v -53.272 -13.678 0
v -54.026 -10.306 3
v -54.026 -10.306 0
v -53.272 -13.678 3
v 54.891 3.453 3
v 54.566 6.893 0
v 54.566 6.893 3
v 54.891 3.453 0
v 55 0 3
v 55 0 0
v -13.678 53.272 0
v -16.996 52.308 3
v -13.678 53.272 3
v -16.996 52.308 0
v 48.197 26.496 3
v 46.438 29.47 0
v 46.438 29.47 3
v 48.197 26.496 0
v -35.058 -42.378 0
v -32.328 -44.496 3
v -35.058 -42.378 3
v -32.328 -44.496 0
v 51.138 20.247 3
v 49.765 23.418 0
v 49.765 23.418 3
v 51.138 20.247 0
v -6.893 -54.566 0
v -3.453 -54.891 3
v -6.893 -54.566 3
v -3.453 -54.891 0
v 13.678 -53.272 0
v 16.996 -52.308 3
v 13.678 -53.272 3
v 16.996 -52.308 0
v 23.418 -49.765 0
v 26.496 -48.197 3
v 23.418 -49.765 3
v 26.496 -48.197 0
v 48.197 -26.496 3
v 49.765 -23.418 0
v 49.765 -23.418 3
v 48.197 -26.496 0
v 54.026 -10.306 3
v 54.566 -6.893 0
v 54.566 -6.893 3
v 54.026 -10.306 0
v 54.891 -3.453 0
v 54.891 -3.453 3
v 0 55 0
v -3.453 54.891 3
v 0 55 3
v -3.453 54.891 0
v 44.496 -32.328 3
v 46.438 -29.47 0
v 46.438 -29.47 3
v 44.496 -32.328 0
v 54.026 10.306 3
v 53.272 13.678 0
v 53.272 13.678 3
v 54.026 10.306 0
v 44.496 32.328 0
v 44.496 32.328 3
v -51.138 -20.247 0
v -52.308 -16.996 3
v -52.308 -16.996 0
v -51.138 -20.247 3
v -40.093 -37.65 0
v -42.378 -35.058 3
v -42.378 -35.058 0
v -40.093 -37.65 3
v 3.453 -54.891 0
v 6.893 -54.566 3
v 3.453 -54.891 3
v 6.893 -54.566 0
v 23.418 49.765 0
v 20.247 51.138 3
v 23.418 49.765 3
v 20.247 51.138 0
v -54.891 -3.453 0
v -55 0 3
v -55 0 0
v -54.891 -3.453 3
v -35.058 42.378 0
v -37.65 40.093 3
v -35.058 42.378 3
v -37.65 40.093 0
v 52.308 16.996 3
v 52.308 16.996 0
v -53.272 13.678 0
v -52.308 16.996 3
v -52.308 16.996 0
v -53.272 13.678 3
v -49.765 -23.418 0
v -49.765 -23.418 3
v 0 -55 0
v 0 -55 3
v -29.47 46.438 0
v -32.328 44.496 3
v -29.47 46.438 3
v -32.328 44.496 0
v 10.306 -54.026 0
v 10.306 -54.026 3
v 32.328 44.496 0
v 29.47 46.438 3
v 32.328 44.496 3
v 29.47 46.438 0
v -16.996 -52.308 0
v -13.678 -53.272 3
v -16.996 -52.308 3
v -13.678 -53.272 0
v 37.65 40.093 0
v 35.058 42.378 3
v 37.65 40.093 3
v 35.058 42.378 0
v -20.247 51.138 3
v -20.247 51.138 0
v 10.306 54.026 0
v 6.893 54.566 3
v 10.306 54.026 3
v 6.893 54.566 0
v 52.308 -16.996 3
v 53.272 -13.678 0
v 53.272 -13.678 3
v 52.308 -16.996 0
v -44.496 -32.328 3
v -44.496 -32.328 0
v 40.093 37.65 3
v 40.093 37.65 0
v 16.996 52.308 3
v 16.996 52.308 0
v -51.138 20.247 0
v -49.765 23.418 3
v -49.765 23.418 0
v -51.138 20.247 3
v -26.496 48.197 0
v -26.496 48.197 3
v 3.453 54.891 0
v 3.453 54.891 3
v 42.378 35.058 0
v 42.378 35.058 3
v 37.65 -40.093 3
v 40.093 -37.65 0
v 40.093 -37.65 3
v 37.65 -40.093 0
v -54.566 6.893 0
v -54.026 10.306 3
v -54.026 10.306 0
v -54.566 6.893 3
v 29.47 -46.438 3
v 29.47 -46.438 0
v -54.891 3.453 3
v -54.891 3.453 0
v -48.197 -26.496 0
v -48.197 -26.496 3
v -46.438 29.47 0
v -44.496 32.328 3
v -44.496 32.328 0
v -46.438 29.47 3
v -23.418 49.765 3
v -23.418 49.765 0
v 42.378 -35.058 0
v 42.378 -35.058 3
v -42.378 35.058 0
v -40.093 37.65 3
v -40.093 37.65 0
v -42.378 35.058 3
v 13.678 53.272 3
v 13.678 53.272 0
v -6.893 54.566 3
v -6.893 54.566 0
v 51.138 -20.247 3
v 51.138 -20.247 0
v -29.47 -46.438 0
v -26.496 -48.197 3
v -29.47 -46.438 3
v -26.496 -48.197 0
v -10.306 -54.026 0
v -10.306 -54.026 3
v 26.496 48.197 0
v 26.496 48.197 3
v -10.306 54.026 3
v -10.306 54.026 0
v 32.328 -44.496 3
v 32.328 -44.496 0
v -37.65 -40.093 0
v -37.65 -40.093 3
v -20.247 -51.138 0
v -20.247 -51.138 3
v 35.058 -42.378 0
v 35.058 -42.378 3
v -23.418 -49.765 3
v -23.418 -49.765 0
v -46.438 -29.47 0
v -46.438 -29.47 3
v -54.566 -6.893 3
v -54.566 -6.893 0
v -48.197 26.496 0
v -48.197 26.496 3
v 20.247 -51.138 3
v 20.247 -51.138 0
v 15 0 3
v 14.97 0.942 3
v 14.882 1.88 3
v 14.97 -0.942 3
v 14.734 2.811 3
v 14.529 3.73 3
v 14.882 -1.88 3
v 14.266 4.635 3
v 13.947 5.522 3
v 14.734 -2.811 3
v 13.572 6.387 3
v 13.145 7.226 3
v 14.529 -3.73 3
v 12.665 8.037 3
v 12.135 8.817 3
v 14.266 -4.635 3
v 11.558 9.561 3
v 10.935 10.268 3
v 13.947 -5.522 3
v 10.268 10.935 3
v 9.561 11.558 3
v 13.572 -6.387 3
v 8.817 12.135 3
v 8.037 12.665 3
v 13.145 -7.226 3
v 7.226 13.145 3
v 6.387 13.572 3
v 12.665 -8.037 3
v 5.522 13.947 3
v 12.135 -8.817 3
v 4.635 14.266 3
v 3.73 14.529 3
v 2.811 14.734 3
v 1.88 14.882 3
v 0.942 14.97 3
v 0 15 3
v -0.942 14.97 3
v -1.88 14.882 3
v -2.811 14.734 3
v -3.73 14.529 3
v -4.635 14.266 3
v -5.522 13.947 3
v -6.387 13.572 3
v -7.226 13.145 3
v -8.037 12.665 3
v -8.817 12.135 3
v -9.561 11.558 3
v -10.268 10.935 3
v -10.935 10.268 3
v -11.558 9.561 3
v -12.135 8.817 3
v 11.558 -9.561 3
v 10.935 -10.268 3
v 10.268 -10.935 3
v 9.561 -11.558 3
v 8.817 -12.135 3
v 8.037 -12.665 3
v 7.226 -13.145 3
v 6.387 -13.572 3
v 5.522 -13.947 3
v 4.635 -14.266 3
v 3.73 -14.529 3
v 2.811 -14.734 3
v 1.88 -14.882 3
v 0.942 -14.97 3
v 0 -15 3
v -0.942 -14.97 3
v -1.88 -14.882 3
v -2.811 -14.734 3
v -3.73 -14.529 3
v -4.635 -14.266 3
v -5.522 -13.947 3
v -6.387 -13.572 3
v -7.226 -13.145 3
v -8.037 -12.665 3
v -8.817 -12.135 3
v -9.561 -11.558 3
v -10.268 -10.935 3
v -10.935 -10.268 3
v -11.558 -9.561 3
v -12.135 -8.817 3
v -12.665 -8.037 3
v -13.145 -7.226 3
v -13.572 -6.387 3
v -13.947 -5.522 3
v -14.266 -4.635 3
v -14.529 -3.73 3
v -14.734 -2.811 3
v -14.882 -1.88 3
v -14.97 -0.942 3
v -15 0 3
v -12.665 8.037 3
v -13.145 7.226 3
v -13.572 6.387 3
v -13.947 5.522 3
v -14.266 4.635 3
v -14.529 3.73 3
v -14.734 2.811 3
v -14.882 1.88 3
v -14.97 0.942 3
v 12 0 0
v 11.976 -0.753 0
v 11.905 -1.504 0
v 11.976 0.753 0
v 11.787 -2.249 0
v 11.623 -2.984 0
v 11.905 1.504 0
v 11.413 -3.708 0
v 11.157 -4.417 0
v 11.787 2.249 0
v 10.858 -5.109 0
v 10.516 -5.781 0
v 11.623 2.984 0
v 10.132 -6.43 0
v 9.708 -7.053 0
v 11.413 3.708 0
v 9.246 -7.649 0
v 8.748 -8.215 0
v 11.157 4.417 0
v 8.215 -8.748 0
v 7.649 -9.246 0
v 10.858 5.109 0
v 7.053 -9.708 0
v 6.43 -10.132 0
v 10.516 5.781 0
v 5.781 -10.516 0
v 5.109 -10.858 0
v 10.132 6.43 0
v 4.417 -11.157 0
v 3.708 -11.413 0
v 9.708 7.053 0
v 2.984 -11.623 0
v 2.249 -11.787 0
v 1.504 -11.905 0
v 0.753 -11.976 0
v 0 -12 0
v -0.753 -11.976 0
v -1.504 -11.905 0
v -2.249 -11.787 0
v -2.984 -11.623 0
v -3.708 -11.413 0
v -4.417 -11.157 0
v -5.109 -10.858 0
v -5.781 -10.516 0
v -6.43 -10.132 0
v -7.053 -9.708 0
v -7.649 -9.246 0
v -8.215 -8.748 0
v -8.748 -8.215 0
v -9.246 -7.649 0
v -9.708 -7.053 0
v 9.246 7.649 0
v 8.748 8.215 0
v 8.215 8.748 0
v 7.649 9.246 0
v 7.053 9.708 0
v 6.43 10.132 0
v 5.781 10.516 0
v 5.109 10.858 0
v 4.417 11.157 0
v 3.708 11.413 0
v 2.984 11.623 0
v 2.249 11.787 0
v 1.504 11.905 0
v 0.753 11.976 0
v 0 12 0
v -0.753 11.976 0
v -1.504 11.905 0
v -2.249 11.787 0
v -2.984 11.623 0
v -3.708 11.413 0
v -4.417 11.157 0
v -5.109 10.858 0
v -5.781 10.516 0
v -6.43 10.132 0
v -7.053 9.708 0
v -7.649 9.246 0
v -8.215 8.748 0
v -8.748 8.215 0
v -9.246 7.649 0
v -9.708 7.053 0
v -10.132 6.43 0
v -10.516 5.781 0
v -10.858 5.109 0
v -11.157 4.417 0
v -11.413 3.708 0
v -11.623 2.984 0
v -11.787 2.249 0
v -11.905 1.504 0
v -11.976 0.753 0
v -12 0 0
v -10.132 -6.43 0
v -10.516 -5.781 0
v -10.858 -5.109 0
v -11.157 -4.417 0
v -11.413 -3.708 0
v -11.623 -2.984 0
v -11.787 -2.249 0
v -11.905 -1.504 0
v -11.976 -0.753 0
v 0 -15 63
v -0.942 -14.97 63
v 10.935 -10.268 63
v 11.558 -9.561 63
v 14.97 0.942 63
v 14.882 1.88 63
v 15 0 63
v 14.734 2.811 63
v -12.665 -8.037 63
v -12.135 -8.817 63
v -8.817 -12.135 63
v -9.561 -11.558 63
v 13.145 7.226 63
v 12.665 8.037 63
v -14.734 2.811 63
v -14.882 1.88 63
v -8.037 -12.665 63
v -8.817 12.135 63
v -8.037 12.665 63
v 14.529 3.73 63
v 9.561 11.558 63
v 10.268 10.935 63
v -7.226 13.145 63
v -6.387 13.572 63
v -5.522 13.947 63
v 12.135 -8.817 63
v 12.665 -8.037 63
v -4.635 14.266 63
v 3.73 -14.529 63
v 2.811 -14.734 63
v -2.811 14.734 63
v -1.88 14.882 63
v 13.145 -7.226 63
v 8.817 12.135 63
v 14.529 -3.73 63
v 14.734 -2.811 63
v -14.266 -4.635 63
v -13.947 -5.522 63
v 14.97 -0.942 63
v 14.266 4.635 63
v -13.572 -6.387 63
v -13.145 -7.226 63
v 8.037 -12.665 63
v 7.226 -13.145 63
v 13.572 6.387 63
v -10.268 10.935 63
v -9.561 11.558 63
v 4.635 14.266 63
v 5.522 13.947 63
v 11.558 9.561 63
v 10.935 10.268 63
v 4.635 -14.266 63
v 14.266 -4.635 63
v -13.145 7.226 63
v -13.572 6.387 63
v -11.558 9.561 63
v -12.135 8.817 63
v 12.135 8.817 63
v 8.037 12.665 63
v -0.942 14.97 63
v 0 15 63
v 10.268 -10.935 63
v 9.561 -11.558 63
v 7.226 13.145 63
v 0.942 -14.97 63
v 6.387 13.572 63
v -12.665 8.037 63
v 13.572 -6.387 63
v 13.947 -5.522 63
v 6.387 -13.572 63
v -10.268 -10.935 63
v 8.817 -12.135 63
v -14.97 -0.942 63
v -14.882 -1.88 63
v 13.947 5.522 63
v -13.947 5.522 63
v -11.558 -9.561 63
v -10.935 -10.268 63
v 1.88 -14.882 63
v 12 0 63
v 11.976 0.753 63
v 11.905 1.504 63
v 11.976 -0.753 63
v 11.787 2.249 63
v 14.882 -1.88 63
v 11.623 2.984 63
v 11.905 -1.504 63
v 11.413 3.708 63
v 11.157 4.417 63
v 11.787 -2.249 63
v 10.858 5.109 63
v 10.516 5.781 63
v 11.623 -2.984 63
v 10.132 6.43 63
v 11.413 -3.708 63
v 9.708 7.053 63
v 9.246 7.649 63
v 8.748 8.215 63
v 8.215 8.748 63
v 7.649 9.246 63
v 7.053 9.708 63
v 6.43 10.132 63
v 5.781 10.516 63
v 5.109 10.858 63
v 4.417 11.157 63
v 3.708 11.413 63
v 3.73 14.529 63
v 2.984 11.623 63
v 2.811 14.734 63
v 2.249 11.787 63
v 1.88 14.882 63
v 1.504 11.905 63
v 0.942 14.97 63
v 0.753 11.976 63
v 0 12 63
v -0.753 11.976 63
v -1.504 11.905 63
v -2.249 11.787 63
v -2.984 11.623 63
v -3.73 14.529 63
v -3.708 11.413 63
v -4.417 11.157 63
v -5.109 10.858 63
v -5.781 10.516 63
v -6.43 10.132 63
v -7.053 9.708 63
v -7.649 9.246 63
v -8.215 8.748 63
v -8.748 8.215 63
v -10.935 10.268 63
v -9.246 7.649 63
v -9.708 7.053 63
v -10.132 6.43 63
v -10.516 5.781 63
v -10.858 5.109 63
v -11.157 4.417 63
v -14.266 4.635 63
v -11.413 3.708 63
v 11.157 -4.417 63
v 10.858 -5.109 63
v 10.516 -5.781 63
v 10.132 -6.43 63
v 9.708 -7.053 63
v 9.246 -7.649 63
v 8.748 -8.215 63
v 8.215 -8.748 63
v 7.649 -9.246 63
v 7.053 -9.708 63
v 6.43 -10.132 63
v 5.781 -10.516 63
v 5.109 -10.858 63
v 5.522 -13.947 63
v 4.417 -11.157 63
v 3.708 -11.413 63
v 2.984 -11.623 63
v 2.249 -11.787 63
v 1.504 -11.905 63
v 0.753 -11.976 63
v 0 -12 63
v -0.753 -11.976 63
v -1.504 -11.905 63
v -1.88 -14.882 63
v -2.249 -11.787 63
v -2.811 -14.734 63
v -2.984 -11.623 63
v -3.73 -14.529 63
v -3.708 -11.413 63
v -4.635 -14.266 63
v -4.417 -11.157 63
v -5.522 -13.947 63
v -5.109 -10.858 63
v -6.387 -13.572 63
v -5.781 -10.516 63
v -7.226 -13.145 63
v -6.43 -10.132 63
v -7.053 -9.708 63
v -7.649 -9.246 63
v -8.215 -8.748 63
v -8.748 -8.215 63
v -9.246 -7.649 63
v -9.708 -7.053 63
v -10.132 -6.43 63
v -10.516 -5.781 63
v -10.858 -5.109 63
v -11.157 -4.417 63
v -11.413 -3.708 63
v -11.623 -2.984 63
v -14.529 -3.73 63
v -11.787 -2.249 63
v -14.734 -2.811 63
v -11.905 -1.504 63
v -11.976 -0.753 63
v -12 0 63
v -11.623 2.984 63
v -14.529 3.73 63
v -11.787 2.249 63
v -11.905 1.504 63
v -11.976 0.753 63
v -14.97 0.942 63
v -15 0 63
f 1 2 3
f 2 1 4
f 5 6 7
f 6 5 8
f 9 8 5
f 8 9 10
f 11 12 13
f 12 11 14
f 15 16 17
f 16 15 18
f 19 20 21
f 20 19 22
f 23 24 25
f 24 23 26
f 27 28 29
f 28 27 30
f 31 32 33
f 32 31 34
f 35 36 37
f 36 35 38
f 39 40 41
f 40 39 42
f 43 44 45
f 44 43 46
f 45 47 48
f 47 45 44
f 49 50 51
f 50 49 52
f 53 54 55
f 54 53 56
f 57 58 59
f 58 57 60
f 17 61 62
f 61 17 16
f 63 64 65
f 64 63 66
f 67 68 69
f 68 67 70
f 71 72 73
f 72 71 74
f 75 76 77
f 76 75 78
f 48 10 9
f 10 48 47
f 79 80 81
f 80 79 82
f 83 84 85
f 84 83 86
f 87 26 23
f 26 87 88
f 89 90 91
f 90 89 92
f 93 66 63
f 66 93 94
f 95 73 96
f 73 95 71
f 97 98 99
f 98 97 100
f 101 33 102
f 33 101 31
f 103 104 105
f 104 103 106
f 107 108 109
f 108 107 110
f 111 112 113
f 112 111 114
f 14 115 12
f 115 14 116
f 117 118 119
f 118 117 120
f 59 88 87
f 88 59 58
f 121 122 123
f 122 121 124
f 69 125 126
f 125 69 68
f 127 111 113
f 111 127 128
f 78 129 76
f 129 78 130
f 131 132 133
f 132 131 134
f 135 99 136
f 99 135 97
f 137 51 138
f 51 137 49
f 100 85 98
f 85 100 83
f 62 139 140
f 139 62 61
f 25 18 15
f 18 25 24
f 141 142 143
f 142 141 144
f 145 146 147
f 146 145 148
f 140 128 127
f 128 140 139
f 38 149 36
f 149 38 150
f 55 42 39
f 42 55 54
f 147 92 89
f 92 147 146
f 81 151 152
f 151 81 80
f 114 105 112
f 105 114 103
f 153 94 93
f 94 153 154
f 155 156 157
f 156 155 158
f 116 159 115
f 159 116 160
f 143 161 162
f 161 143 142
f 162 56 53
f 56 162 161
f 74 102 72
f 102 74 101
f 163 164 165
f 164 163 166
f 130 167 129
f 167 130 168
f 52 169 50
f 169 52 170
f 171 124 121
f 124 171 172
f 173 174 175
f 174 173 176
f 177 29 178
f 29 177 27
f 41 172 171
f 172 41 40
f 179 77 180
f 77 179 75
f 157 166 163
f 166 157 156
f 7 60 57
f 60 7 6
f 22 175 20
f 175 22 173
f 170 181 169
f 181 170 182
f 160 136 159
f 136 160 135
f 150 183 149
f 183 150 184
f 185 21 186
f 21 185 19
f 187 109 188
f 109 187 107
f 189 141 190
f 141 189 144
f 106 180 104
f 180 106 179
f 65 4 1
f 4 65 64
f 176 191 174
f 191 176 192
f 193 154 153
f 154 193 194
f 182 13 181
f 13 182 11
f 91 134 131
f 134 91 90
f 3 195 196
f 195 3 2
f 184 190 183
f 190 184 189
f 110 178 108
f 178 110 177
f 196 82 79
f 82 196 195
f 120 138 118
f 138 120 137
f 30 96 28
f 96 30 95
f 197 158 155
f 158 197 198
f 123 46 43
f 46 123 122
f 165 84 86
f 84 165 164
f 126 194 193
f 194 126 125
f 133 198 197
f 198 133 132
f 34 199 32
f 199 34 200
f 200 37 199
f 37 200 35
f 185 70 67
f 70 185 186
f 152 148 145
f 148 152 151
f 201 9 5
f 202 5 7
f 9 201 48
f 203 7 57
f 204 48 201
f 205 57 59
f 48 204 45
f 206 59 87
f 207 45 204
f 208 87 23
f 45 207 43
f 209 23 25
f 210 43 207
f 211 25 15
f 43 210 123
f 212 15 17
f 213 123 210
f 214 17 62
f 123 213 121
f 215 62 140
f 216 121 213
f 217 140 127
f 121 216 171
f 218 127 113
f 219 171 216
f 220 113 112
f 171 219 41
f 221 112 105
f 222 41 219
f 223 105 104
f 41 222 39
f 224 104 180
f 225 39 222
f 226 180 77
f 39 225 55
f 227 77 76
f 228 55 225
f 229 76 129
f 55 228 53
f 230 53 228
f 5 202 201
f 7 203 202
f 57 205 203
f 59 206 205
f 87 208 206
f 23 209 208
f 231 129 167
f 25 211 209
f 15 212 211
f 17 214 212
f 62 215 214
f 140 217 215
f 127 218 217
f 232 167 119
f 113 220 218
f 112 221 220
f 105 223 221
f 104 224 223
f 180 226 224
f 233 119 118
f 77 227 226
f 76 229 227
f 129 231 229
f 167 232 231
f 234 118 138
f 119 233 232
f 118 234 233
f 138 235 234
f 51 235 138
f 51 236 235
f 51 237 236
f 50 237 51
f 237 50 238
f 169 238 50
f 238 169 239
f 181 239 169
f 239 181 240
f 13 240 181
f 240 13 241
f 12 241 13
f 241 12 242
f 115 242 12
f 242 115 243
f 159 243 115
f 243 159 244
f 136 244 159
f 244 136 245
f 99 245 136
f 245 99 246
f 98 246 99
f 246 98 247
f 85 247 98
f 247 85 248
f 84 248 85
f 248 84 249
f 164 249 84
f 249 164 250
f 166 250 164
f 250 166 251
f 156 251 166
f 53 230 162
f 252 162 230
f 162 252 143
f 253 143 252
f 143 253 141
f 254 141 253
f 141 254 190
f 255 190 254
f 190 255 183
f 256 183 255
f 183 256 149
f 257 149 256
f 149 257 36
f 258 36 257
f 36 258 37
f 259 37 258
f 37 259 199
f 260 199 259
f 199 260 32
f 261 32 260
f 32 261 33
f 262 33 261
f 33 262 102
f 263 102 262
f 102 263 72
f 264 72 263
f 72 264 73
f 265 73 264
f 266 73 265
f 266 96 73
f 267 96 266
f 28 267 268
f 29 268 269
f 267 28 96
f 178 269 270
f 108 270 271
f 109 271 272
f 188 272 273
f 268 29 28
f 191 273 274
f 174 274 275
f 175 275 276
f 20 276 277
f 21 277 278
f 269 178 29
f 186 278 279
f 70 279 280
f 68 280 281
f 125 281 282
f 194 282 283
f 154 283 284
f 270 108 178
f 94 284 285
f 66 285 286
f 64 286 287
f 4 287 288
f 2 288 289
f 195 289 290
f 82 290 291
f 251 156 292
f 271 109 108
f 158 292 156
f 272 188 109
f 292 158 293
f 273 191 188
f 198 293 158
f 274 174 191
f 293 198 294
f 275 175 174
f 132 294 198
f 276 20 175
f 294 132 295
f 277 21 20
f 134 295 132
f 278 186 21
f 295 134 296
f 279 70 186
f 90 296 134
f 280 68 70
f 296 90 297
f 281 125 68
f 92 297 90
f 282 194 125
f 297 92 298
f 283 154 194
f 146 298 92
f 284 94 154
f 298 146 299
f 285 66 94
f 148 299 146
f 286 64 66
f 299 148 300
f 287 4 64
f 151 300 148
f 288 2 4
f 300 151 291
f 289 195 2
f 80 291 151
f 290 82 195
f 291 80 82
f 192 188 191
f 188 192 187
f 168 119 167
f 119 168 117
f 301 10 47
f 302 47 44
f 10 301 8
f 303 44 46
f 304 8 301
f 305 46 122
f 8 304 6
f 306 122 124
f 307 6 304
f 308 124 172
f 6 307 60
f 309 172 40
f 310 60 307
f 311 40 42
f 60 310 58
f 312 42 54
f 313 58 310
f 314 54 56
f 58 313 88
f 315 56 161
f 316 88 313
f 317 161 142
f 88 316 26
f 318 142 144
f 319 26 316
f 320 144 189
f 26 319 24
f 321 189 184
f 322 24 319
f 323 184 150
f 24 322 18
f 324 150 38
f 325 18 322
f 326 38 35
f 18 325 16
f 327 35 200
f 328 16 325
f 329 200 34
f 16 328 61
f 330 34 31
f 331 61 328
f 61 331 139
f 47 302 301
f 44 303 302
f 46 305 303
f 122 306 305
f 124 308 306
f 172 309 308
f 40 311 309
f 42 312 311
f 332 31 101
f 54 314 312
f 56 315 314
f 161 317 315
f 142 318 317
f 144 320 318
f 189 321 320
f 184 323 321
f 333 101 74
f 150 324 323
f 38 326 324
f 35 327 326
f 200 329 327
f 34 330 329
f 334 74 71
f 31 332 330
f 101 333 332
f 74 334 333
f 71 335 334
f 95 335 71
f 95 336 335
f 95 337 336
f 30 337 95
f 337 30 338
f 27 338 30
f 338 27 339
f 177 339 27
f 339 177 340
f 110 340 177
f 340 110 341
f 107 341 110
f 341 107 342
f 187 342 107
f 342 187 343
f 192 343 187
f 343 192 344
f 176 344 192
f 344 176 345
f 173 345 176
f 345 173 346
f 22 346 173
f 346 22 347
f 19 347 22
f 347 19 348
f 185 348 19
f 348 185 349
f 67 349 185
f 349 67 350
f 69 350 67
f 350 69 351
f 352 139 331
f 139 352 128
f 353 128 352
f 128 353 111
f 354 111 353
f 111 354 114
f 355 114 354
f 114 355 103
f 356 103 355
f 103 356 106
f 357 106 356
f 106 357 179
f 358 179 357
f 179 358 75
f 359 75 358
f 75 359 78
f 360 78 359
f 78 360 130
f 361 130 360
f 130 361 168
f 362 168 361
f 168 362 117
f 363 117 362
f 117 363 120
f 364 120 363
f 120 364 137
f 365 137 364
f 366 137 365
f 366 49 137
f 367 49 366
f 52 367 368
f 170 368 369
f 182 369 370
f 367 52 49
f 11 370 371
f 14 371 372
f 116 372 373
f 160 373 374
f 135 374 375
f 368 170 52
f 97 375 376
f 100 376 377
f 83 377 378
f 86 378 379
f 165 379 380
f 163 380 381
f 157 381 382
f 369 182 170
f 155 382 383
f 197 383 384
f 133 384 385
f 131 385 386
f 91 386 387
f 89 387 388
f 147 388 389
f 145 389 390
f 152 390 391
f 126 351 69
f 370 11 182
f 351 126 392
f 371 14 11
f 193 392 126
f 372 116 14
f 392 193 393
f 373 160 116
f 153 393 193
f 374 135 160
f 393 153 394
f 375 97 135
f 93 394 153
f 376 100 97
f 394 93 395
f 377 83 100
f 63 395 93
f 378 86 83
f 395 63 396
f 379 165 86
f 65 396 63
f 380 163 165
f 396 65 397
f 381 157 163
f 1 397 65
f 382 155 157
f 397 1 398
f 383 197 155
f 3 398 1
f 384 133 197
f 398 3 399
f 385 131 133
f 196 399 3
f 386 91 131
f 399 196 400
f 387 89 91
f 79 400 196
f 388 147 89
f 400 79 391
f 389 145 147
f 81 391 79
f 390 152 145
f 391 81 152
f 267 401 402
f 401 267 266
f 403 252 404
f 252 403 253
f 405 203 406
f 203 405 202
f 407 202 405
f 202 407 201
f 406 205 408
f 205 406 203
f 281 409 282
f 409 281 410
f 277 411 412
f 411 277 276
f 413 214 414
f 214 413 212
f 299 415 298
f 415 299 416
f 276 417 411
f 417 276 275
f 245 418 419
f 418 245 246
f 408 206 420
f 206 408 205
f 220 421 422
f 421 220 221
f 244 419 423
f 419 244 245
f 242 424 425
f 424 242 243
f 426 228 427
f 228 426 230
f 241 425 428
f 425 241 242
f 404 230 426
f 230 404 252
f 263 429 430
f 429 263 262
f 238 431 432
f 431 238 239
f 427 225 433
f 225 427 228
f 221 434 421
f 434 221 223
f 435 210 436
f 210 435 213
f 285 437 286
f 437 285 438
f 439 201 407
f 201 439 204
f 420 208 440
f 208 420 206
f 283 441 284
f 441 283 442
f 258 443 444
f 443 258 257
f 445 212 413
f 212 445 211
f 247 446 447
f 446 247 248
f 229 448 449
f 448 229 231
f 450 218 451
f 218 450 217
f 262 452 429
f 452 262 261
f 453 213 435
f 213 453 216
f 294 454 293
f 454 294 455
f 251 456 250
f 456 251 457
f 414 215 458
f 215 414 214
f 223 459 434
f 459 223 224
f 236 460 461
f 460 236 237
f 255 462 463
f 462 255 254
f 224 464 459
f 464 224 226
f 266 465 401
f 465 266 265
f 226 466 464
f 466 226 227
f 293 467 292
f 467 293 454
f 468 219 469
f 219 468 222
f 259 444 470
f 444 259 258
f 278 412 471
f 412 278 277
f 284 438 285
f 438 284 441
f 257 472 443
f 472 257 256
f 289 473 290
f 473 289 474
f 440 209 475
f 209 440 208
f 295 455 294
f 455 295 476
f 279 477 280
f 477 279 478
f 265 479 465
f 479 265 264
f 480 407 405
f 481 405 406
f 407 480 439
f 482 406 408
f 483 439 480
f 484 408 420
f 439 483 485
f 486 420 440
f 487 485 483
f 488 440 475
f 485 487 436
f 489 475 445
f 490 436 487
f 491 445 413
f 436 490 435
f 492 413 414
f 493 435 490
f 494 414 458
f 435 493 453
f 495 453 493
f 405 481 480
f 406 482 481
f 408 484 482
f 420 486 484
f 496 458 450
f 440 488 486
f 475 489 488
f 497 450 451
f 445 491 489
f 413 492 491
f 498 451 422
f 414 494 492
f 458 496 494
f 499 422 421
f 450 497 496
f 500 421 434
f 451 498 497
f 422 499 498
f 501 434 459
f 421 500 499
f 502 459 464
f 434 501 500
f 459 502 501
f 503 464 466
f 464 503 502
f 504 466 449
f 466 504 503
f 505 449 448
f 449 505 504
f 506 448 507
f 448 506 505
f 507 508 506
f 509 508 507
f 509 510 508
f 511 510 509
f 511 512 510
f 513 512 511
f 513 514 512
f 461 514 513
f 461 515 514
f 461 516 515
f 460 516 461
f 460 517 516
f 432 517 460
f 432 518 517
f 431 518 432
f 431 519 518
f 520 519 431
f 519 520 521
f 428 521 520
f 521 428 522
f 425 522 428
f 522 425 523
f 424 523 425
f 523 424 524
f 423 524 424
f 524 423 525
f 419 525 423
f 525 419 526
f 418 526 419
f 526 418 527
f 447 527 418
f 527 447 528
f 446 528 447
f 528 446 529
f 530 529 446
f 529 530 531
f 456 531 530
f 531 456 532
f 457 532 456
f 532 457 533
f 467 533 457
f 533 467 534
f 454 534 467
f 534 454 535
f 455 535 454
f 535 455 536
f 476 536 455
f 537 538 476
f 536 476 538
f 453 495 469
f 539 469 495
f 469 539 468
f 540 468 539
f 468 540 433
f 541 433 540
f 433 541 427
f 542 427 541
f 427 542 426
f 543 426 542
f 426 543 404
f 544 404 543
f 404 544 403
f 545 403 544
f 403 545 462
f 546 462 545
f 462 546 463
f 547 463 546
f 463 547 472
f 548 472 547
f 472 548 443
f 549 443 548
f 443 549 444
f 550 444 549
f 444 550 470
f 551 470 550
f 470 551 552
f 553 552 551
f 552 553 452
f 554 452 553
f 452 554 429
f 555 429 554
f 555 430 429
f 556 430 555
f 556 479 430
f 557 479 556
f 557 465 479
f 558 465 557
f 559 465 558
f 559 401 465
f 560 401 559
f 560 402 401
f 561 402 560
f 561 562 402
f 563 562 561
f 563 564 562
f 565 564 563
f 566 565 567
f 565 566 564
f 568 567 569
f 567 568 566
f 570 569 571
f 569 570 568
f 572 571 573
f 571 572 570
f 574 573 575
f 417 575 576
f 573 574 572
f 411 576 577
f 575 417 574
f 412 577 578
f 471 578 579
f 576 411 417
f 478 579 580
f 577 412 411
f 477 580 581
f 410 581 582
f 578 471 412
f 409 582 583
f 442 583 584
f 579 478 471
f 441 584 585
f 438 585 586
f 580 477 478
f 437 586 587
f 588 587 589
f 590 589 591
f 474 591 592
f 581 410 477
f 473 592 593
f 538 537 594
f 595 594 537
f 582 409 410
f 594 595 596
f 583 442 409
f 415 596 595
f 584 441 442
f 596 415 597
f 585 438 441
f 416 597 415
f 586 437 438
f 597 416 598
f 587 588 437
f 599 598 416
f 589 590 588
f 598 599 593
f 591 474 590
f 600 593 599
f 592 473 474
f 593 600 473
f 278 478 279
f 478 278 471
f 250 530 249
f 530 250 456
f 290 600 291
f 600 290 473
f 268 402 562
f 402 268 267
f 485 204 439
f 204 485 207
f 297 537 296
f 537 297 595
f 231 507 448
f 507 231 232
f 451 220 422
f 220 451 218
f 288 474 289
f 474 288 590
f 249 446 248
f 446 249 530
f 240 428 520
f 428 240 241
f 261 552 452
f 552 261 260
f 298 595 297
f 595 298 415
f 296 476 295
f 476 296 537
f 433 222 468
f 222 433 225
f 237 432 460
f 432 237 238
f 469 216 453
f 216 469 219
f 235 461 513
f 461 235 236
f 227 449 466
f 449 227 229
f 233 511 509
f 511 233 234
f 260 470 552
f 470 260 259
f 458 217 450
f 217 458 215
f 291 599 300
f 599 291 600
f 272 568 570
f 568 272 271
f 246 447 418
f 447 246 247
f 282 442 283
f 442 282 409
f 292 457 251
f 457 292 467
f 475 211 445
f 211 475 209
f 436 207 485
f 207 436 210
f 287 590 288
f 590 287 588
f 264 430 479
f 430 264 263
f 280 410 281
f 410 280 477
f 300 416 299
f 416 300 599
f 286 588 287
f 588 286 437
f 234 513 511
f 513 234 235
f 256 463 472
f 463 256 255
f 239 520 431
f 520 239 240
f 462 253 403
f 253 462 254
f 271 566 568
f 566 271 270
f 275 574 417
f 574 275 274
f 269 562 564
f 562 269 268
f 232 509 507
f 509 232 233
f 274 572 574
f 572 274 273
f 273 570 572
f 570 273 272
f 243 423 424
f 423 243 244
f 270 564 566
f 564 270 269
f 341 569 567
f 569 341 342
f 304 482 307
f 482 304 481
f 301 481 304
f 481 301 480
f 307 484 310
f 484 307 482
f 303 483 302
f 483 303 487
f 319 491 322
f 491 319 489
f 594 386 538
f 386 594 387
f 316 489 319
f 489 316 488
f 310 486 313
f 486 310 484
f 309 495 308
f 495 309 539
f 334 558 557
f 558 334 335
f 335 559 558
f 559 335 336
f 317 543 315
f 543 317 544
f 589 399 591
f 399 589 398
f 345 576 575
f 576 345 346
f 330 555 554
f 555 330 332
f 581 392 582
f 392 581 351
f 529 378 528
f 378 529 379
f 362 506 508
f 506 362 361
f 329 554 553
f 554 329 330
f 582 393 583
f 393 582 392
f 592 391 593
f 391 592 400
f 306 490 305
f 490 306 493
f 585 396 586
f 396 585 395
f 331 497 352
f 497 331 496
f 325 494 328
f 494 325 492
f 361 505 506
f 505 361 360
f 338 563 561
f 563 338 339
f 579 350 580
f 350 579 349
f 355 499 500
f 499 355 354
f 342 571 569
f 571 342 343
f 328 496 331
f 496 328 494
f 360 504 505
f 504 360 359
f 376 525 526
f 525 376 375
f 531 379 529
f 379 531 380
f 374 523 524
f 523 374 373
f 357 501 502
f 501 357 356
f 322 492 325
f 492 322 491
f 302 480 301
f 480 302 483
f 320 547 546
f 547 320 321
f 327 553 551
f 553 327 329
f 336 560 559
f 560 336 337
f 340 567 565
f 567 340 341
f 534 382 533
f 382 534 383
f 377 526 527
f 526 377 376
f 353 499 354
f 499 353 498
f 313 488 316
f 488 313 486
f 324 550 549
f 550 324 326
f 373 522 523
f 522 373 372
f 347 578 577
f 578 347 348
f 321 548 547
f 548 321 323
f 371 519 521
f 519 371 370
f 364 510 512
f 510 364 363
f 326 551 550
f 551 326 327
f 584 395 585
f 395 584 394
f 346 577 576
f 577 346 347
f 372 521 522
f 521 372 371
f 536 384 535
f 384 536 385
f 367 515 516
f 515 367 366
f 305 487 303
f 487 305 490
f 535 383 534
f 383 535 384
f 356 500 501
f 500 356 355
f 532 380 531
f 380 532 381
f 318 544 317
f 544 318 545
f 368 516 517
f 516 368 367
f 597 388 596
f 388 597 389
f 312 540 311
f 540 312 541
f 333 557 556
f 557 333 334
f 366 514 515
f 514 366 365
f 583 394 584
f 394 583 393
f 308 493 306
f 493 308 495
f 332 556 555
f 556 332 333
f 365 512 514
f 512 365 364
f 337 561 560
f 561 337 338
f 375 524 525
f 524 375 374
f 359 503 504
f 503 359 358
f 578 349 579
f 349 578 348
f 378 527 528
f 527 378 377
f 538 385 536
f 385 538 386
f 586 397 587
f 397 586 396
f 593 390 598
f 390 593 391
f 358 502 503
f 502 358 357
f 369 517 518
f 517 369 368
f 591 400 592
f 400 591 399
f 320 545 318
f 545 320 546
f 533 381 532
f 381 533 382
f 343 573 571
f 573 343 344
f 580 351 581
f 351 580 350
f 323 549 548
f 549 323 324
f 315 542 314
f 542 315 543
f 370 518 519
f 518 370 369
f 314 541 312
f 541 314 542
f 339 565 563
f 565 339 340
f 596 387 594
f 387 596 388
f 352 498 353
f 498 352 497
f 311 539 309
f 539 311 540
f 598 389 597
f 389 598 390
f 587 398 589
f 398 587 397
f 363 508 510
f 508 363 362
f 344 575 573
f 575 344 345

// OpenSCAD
// Enter the spool hole diameter in mm
spoolHoleD = 32;

// Enter the thickness of the spool in mm
spoolHeight = 60;


difference()
{
    union()
    {
        cylinder(r = 55, h = 3);
        cylinder(r = (spoolHoleD-2)/2, h = spoolHeight+3);
    }
    cylinder(r = ((spoolHoleD-2)/2)-3, h = spoolHeight+3);
}
$fn = 100;
